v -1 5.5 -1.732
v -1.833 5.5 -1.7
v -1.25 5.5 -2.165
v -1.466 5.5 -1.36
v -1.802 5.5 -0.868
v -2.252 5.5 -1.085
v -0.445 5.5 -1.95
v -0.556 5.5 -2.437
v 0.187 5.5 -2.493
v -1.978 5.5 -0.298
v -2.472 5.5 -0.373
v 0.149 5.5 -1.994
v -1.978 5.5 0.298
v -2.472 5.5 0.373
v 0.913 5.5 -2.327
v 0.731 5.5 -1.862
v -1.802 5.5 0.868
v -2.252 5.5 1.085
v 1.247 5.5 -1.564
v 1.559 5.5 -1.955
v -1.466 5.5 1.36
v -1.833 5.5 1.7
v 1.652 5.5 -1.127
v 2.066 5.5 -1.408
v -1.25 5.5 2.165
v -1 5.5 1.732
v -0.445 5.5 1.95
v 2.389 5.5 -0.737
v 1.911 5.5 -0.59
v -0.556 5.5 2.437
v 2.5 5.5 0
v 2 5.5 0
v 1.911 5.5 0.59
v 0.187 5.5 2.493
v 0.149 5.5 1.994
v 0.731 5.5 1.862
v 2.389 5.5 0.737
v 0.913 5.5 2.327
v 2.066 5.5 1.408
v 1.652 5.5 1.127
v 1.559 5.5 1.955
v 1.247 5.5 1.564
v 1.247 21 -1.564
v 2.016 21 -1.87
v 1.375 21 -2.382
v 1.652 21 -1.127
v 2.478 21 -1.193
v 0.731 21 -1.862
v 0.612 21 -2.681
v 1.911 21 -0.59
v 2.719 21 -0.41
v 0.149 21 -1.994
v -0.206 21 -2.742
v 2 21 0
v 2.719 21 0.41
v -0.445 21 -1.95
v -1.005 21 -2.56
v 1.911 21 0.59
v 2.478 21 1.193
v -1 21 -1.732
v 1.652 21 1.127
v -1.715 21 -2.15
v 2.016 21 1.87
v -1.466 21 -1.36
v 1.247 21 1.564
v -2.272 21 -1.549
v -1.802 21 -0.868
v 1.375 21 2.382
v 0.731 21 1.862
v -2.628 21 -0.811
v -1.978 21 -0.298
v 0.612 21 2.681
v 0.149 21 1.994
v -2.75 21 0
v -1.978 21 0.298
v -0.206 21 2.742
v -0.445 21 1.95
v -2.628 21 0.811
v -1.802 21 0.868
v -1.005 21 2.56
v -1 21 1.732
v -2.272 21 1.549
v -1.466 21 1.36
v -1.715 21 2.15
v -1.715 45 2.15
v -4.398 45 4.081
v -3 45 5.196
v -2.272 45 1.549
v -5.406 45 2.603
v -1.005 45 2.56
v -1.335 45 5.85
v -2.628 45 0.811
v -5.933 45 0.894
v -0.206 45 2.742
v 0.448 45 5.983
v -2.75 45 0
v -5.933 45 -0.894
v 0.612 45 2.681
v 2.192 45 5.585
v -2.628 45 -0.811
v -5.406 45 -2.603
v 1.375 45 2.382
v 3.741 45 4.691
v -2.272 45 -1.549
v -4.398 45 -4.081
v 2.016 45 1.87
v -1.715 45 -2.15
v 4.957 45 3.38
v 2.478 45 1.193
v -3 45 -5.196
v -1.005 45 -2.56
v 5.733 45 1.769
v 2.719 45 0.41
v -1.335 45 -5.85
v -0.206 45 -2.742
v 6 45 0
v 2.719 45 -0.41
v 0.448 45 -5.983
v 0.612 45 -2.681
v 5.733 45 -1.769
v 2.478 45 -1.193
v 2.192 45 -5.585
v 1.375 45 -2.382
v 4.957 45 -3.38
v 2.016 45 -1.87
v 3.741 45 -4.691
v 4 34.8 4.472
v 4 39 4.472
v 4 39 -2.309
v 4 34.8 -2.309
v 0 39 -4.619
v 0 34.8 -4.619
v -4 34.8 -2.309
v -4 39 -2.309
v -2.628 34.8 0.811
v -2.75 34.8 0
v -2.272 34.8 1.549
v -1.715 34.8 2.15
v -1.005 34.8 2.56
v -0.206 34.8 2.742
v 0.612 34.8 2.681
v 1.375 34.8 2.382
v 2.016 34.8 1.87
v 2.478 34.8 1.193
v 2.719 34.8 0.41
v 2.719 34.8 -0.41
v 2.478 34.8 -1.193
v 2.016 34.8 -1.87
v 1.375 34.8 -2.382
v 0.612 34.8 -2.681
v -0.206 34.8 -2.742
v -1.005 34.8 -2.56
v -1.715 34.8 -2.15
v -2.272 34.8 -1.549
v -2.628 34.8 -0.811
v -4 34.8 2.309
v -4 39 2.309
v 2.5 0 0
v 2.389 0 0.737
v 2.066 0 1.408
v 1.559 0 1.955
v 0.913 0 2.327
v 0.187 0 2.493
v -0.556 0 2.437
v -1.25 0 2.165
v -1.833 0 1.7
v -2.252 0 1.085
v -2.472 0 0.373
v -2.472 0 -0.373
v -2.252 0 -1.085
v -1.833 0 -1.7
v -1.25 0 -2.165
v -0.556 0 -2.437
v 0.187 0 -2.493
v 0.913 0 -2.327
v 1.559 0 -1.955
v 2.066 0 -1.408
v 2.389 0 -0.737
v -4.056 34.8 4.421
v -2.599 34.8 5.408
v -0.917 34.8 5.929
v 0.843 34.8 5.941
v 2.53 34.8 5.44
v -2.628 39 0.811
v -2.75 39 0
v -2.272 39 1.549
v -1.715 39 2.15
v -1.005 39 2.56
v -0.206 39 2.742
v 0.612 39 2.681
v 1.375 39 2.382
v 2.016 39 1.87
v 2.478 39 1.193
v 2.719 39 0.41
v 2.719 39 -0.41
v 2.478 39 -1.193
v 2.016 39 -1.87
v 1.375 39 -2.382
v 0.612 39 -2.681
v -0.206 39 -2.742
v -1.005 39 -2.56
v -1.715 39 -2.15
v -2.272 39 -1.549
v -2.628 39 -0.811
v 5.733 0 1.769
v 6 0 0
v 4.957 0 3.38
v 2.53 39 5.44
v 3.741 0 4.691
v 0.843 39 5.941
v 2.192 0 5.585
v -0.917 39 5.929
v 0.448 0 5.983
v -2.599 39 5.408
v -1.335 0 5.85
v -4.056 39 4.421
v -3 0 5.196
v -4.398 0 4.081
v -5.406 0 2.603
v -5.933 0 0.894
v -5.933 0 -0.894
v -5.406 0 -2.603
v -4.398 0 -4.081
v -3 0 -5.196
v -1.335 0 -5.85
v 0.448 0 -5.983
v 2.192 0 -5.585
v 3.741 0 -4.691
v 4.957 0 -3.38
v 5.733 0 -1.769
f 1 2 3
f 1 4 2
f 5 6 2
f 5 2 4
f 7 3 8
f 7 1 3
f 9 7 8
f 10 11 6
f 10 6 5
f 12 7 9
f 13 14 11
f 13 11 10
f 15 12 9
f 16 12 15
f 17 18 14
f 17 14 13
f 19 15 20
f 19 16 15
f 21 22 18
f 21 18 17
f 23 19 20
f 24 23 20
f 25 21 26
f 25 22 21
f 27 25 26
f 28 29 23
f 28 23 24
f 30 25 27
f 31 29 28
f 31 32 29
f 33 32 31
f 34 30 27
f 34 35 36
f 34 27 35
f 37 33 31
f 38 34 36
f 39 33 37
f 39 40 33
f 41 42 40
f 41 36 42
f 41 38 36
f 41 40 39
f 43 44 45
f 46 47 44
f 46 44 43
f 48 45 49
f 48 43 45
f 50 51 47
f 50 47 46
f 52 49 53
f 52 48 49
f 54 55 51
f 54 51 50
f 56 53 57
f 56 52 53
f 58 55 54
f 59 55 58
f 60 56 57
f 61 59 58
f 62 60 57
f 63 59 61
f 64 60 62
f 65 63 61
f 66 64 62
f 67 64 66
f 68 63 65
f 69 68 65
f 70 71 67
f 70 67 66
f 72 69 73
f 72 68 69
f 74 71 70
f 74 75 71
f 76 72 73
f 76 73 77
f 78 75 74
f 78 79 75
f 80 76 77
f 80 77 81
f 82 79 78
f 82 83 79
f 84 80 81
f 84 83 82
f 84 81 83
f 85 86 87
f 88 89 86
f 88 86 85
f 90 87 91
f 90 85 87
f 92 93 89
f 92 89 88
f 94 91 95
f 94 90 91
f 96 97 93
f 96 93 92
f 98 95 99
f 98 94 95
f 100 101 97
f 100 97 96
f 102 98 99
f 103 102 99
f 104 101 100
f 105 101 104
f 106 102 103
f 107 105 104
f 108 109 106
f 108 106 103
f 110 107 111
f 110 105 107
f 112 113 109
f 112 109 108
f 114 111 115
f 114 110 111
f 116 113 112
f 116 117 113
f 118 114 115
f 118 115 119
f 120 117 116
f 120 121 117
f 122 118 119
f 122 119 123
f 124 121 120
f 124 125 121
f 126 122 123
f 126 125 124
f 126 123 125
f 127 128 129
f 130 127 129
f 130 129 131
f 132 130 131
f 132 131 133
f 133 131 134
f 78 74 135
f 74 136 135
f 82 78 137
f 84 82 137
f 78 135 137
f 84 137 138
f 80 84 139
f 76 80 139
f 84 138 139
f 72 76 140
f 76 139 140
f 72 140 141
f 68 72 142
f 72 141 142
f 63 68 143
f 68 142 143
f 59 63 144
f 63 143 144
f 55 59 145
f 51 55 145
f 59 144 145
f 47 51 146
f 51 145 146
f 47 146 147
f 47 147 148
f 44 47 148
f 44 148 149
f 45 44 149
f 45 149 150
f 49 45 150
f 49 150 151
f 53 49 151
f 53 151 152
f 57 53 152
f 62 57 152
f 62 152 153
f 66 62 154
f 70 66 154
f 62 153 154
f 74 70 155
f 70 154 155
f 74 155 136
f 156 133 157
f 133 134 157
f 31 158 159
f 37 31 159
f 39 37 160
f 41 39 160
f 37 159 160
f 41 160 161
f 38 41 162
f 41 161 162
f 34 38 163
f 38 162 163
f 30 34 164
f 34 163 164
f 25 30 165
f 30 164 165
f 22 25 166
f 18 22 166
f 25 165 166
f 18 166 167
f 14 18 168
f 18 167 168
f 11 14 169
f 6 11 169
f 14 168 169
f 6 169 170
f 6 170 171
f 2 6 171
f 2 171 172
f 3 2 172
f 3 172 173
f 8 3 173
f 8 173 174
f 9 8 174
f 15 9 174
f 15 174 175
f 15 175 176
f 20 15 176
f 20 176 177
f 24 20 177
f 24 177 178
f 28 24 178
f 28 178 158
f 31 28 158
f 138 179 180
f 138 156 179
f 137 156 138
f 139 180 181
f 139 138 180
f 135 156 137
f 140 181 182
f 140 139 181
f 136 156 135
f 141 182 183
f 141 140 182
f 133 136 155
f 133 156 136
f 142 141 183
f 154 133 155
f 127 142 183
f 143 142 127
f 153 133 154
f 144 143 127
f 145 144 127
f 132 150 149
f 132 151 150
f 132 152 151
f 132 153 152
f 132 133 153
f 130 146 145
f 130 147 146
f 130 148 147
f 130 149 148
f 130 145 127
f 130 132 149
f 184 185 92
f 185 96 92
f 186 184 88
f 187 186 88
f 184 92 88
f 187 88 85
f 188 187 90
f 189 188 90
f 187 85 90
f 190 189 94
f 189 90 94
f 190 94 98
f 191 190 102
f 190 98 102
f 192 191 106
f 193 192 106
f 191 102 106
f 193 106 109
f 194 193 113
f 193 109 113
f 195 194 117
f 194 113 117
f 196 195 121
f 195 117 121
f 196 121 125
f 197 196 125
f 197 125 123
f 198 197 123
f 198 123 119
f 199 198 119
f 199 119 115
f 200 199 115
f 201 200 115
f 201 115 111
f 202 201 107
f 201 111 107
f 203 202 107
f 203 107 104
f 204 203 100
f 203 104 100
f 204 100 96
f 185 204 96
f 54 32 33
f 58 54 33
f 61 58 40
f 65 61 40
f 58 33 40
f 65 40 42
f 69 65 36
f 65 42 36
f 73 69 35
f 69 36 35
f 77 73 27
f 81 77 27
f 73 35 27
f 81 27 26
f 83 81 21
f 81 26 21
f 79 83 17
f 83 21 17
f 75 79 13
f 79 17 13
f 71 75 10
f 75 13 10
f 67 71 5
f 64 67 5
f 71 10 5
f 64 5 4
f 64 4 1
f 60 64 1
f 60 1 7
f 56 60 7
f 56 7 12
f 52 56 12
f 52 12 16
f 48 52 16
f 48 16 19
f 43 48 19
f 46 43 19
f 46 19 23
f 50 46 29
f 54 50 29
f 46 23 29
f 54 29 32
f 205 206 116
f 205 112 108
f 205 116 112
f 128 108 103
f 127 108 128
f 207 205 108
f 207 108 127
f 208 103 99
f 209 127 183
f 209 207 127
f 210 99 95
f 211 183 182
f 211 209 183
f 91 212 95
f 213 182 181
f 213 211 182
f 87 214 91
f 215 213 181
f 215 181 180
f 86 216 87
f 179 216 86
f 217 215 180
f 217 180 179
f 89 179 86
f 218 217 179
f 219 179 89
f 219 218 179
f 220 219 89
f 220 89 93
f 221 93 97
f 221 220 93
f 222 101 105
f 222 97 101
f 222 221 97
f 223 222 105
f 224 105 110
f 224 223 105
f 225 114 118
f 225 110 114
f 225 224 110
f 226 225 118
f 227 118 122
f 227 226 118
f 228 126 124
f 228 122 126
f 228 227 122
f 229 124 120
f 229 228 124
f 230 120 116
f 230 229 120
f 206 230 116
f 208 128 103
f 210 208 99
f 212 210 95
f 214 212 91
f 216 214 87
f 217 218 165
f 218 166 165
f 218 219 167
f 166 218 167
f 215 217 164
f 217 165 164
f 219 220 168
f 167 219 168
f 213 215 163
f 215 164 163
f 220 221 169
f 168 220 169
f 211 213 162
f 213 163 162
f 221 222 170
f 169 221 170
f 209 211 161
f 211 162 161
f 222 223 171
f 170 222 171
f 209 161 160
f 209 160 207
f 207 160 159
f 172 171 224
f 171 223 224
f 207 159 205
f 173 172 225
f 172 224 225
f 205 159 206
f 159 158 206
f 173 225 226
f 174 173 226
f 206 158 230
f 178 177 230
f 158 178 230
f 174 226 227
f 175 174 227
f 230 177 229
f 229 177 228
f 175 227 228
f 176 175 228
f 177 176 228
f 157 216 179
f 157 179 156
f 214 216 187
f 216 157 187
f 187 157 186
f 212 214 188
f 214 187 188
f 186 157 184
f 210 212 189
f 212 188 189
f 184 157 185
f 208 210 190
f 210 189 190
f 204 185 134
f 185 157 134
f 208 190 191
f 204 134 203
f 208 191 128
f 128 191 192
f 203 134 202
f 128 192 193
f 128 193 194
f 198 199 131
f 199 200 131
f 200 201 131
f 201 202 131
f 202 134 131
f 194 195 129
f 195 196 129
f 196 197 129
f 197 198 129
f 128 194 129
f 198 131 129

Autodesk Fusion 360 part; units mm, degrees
sketch "Sketch1" plane through (0, 0, 0) normal (0, 1, 0) x (1, 0, 0)
  circle A0 centre (0, 0) radius 6
  dimension "d1" = 12
extrude "Extrude1" add sketch "Sketch1" along normal blind 45
sketch "Sketch2" plane through (0, 0, 0) normal (0, -1, 0) x (1, 0, 0)
  circle A0 centre (0, 0) radius 6
  circle A1 centre (0, 0) radius 1.6031
  circle A2 centre (0, 0) radius 2.5
  circle A3 centre (0, 0) radius 2
  dimension "d4" = 5
  dimension "d5" = 4
extrude "Extrude2" cut sketch "Sketch2" against normal blind 5.5 contours A2
extrude "Extrude3" cut 1 faces at (1.1392, 0, 0.5006) along direction (0, 1, 0) blind 71
sketch "Sketch3" plane through (0, 45, 0) normal (0, 1, 0) x (-1, 0, 0)
  circle A0 centre (0, 0) radius 2
  circle A1 centre (0, 0) radius 6
  circle A2 centre (0, 0) radius 2.75
  dimension "d10" = 5.5
extrude "Extrude4" cut sketch "Sketch3" against normal blind 24 contours A2
ref_plane "WorkPlane1" through (0, 39, 0) normal (0, 1, 0) x (1, 0, 0)
sketch "Sketch4" plane through (0, 39, 0) normal (0, 1, 0) x (1, 0, 0)
  line L0 (4, 2.3094) -> (0, 4.6188)
  line L1 (0, 4.6188) -> (-4, 2.3094)
  line L2 (-4, 2.3094) -> (-4, -2.3094)
  line L3 (-4, -2.3094) -> (0, -4.6188)
  line L4 (0, -4.6188) -> (4, -2.3094)
  line L5 (4, -2.3094) -> (4, 2.3094)
  line L6 (4, -2.3094) -> (4, -7)
  line L7 (4, -7) -> (-4.1244, -7)
  line L8 (-4.1244, -7) -> (-4, -2.3094)
  dimension "d14" = 4
extrude "Extrude5" cut sketch "Sketch4" against normal blind 4.2
